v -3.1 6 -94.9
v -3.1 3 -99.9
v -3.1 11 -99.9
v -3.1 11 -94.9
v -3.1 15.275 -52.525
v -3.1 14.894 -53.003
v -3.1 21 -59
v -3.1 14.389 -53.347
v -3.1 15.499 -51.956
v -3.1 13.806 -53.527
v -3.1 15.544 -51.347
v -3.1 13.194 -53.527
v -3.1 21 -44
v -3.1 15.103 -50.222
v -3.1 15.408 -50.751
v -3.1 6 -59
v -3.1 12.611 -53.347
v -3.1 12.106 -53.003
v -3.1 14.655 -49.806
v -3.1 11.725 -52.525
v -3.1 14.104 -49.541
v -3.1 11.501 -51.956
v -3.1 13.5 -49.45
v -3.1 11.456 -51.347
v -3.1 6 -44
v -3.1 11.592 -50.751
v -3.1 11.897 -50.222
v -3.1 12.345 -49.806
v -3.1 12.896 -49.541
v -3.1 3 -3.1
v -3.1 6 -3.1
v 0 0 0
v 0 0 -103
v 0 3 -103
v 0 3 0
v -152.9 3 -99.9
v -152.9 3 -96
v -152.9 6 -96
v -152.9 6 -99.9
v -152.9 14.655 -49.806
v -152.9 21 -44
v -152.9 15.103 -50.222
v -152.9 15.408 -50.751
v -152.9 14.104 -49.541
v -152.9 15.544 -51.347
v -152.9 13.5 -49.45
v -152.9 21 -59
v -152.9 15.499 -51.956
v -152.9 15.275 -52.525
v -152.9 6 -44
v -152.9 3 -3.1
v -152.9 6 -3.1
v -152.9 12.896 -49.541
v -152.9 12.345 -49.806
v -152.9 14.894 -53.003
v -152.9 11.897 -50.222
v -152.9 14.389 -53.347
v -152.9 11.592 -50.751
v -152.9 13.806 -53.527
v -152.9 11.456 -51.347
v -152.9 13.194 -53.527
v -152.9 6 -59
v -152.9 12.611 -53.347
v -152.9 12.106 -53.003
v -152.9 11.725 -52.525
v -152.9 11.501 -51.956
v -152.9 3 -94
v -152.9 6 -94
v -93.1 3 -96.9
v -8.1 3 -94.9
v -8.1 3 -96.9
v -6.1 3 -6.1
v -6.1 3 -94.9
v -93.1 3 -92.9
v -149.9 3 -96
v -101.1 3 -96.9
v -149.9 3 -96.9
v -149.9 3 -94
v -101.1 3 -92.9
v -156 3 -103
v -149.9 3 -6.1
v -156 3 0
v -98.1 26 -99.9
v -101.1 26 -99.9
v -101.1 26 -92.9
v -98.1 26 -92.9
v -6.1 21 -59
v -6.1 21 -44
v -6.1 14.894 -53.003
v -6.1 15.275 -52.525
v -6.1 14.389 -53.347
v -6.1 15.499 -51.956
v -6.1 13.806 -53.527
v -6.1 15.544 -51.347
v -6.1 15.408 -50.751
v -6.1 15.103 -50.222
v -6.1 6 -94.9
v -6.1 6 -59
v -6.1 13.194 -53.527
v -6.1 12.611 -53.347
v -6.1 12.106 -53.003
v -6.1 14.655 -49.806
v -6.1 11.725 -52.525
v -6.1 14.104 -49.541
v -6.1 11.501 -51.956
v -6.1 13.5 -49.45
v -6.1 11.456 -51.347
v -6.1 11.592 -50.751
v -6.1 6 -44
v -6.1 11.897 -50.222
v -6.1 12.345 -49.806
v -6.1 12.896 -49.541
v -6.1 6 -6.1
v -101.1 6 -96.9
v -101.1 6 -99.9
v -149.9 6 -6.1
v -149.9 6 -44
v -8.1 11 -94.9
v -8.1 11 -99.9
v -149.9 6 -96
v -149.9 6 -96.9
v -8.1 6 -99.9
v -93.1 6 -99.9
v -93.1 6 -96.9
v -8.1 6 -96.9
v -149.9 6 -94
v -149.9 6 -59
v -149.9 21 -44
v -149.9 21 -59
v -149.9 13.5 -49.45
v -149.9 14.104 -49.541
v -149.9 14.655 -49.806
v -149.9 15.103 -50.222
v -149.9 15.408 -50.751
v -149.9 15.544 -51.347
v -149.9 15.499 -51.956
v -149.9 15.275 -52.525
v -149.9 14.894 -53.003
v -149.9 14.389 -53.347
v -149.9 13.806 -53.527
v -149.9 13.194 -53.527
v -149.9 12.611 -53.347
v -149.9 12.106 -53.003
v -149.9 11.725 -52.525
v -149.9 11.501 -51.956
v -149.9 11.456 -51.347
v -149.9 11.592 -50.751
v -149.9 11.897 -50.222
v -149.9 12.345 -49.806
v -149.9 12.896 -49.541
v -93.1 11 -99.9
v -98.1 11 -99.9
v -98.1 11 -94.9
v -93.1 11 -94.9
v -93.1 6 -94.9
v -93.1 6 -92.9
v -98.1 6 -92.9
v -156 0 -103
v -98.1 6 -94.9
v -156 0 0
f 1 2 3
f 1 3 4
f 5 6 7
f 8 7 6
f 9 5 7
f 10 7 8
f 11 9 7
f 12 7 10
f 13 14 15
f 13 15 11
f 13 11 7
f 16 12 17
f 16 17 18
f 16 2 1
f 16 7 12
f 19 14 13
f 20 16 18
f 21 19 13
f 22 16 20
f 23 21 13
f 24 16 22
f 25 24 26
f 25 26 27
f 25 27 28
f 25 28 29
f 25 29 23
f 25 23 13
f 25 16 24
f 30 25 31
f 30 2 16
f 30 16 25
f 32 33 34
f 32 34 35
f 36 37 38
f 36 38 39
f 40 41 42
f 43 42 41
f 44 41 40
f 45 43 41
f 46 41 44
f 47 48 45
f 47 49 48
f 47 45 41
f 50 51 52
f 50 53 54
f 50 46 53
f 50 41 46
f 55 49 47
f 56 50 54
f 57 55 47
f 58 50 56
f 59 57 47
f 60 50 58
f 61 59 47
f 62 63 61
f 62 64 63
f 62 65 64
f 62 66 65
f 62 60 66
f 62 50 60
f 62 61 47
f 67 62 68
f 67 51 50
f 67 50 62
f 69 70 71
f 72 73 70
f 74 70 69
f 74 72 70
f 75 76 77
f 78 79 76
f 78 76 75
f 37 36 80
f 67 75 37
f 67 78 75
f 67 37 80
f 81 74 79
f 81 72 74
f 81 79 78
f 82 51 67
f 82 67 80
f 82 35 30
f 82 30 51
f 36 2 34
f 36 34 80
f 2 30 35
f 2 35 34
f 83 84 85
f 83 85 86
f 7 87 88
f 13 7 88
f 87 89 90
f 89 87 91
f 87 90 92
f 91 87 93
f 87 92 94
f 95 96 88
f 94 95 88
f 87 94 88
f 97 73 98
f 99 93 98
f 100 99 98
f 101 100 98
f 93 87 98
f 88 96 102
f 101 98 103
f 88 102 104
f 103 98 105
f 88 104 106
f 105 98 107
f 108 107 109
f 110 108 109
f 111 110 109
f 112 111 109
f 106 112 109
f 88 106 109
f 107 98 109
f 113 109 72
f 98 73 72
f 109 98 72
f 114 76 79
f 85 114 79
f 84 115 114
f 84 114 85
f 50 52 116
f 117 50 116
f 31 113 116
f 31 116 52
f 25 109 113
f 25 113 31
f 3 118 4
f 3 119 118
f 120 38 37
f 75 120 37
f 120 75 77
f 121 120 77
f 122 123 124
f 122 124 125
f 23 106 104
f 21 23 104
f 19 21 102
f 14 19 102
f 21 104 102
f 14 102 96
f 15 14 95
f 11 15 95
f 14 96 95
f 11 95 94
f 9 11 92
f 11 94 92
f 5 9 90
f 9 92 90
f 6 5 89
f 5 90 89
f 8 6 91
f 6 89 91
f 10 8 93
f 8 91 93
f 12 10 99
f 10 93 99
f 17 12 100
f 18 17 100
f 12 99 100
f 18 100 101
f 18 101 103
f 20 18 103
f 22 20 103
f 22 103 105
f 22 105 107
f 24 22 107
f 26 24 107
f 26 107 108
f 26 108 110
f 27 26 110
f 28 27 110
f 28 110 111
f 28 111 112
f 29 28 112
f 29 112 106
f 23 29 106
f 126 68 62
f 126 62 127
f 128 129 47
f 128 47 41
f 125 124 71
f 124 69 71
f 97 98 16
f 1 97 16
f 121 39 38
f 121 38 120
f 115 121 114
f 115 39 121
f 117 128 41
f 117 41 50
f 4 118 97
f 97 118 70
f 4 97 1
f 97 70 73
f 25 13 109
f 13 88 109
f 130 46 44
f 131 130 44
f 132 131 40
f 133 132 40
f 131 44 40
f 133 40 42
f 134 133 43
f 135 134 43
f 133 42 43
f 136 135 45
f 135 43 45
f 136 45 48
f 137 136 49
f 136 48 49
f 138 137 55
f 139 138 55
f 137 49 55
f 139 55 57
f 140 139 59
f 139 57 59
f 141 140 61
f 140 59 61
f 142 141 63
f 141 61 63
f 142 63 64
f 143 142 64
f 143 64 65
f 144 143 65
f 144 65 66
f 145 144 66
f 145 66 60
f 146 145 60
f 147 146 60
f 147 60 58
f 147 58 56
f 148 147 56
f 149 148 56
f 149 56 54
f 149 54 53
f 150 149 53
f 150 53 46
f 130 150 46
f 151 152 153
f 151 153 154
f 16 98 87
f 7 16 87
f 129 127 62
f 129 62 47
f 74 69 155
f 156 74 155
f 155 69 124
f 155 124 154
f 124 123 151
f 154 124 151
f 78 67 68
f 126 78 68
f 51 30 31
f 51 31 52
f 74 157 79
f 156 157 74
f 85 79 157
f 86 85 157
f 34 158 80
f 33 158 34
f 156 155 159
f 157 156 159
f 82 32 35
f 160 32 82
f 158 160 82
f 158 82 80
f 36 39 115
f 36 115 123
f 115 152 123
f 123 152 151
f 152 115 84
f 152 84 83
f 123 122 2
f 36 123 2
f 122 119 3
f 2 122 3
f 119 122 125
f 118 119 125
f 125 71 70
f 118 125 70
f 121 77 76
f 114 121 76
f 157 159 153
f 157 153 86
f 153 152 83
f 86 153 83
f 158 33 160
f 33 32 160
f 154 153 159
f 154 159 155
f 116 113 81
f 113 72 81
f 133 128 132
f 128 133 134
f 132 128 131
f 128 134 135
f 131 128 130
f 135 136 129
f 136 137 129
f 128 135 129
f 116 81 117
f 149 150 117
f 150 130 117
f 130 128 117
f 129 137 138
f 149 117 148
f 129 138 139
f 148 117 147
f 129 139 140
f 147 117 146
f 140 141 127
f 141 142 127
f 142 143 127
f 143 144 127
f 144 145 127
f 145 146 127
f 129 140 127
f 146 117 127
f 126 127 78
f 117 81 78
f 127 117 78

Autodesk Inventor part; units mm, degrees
ref_plane "YZ Plane" through (0, 0, 0) normal (1, 0, 0) x (0, 1, 0)
sketch "Esboço6" plane through (0, 0, 0) normal (0, 1, 0) x (-1, 0, 0)
  line L0 (0, 0) -> (156, 0)
  line L1 (156, 0) -> (156, -103)
  line L2 (156, -103) -> (0, -103)
  line L3 (0, -103) -> (0, 0)
  dimension "d22" = 156
  dimension "d23" = 103
extrude "Extrusão4" add sketch "Esboço6" along normal blind 3
sketch "Esboço7" plane through (0, 3, 0) normal (0, 1, 0) x (1, 0, 0)
  line L0 (-152.9, 99.9) -> (-3.1, 99.9)
  line L1 (-3.1, 99.9) -> (-3.1, 3.1)
  line L2 (-3.1, 3.1) -> (-152.9, 3.1)
  line L3 (-152.9, 3.1) -> (-152.9, 99.9)
  line L4 (0, 0) -> (0, 103) projected
  line L5 (0, 103) -> (-156, 103) projected
  line L6 (-156, 103) -> (-156, 0) projected
  line L7 (-156, 0) -> (0, 0) projected
  line L8 (-149.9, 96.9) -> (-6.1, 96.9)
  line L9 (-6.1, 96.9) -> (-6.1, 6.1)
  line L10 (-6.1, 6.1) -> (-149.9, 6.1)
  line L11 (-149.9, 6.1) -> (-149.9, 96.9)
  dimension "d26" = 3.1
  dimension "d27" = 3.1
  dimension "d28" = 3.1
  dimension "d29" = 3.1
  dimension "d30" = 3
  dimension "d31" = 3
  dimension "d32" = 3
  dimension "d33" = 3
extrude "Extrusão5" add sketch "Esboço7" along normal blind 3 contours L0 L1 L2 L3
sketch "Esboço10" plane through (0, 6, 0) normal (0, 1, 0) x (1, 0, 0)
  line L0 (-3.1, 99.9) -> (-3.1, 3.1) projected
  line L1 (-3.1, 99.9) -> (-8.1, 99.9)
  line L2 (-8.1, 99.9) -> (-8.1, 94.9)
  line L3 (-8.1, 94.9) -> (-3.1, 94.9)
  line L4 (-3.1, 94.9) -> (-3.1, 99.9)
  line L5 (-152.9, 99.9) -> (-3.1, 99.9) projected
  line L6 (-93.1, 99.9) -> (-101.1, 99.9)
  line L7 (-101.1, 99.9) -> (-101.1, 94.9)
  line L8 (-101.1, 94.9) -> (-93.1, 94.9)
  line L9 (-93.1, 94.9) -> (-93.1, 99.9)
  point P0 (0, 0)
  dimension "d36" = 5
  dimension "d37" = 5
  dimension "d38" = 85
  dimension "d39" = 8
  dimension "d40" = 5
extrude "Extrusão6" add sketch "Esboço10" along normal blind 5 and the other way blind 6
sketch "Esboço13" plane through (-101.1, 3, -94.9) normal (0, 0, 1) x (1, 0, 0)
  line L0 (93, 3) -> (8, 3) projected
  line L1 (8, 3) -> (0, 3)
  line L2 (0, 3) -> (0, 23)
  line L3 (0, 23) -> (3, 23)
  line L4 (3, 23) -> (3, 8)
  line L5 (8, 8) -> (0, 8) projected
  line L6 (3, 8) -> (8, 8)
  line L7 (8, 8) -> (8, 3)
  point P0 (101.1, -3)
  dimension "d45" = 8
  dimension "d46" = 20
  dimension "d47" = 3
extrude "Extrusão7" add sketch "Esboço13" against normal blind 5 contours L2 L3 L4 L5
sketch "Esboço14" plane through (-101.1, 3, -94.9) normal (0, 0, 1) x (1, 0, 0)
  line L0 (0, 3) -> (0, 23) projected
  line L1 (0, 23) -> (3, 23) projected
  line L2 (0, 23) -> (3, 23)
  line L3 (-54.9, -3) -> (101.1, -3) projected
  line L4 (0, 0) -> (0, 23)
  line L5 (0, 0) -> (8, 0)
  line L6 (-51.8, 0) -> (98, 0) projected
  line L7 (8, 0) -> (8, 3)
  line L8 (93, 3) -> (8, 3) projected
  line L9 (8, 3) -> (3, 3)
  line L10 (3, 3) -> (3, 23)
  line L11 (3, 23) -> (3, 8) projected
  line L12 (8, 8) -> (3, 8) projected
  dimension "d53" = 8
  dimension "d54" = 5
  dimension "d55" = 5
extrude "Extrusão8" add sketch "Esboço14" along normal blind 2
ref_plane "Plano de trabalho1" through (-6.1, 6, -50.5) normal (-1, 0, 0) x (0, 0, 1)
ref_plane "Plano de trabalho2" through (-149.9, 6, -51.5) normal (1, 0, 0) x (0, 0, -1)
sketch "Esboço18" plane through (-6.1, 6, -50.5) normal (-1, 0, 0) x (0, 0, 1)
  line L0 (6.5, 0) -> (-8.5, 0)
  line L1 (-8.5, 0) -> (-8.5, 15)
  line L2 (-8.5, 15) -> (6.5, 15)
  line L3 (6.5, 15) -> (6.5, 0)
  line L4 (-49.4, 0) -> (47.4, 0) projected
  line L5 (47.4, -3) -> (47.4, 0) projected
  dimension "d67" = 15
  dimension "d68" = 15
  dimension "d71" = 40.9
extrude "Extrusão9" add sketch "Esboço18" against normal blind 3
sketch "Esboço19" plane through (-149.9, 6, -51.5) normal (1, 0, 0) x (0, 0, -1)
  line L0 (-7.5, 0) -> (7.5, 0)
  line L1 (7.5, 0) -> (7.5, 15)
  line L2 (7.5, 15) -> (-7.5, 15)
  line L3 (-7.5, 15) -> (-7.5, 0)
  line L4 (48.4, -3) -> (48.4, 0) projected
  line L5 (48.4, 0) -> (-48.4, 0) projected
  point P0 (-51.5, -6)
  dimension "d72" = 15
  dimension "d73" = 15
  dimension "d74" = 40.9
extrude "Extrusão10" add sketch "Esboço19" against normal blind 3
sketch "Esboço21" plane through (-152.9, 3, -99.9) normal (-1, 0, 0) x (0, 0, 1)
  circle A0 centre (48.4, 10.5) radius 2.05
  line L0 (55.9, 3) -> (55.9, 18) projected
  line L1 (55.9, 18) -> (40.9, 18) projected
  dimension "d87" = 7.5
  dimension "d88" = 7.5
  dimension "d89" = 4.1
extrude "Extrusão13" cut sketch "Esboço21" against normal through all
sketch "Esboço22" plane through (-152.9, 3, -99.9) normal (-1, 0, 0) x (0, 0, 1)
  line L0 (5, 3) -> (40.9, 3) projected
  line L1 (99.9, 0) -> (-3.1, 0) projected
  line L2 (5.9, 3) -> (3.9, 3)
  line L3 (3.9, 3) -> (3.9, 0)
  line L4 (3.9, 0) -> (5.9, 0)
  line L5 (5.9, 0) -> (5.9, 3)
  line L6 (-3.1, -3) -> (-3.1, 0) projected
  dimension "d92" = 2
  dimension "d93" = 7
extrude "Extrusão14" cut sketch "Esboço22" against normal blind 10
properties part number "Encaixe"
